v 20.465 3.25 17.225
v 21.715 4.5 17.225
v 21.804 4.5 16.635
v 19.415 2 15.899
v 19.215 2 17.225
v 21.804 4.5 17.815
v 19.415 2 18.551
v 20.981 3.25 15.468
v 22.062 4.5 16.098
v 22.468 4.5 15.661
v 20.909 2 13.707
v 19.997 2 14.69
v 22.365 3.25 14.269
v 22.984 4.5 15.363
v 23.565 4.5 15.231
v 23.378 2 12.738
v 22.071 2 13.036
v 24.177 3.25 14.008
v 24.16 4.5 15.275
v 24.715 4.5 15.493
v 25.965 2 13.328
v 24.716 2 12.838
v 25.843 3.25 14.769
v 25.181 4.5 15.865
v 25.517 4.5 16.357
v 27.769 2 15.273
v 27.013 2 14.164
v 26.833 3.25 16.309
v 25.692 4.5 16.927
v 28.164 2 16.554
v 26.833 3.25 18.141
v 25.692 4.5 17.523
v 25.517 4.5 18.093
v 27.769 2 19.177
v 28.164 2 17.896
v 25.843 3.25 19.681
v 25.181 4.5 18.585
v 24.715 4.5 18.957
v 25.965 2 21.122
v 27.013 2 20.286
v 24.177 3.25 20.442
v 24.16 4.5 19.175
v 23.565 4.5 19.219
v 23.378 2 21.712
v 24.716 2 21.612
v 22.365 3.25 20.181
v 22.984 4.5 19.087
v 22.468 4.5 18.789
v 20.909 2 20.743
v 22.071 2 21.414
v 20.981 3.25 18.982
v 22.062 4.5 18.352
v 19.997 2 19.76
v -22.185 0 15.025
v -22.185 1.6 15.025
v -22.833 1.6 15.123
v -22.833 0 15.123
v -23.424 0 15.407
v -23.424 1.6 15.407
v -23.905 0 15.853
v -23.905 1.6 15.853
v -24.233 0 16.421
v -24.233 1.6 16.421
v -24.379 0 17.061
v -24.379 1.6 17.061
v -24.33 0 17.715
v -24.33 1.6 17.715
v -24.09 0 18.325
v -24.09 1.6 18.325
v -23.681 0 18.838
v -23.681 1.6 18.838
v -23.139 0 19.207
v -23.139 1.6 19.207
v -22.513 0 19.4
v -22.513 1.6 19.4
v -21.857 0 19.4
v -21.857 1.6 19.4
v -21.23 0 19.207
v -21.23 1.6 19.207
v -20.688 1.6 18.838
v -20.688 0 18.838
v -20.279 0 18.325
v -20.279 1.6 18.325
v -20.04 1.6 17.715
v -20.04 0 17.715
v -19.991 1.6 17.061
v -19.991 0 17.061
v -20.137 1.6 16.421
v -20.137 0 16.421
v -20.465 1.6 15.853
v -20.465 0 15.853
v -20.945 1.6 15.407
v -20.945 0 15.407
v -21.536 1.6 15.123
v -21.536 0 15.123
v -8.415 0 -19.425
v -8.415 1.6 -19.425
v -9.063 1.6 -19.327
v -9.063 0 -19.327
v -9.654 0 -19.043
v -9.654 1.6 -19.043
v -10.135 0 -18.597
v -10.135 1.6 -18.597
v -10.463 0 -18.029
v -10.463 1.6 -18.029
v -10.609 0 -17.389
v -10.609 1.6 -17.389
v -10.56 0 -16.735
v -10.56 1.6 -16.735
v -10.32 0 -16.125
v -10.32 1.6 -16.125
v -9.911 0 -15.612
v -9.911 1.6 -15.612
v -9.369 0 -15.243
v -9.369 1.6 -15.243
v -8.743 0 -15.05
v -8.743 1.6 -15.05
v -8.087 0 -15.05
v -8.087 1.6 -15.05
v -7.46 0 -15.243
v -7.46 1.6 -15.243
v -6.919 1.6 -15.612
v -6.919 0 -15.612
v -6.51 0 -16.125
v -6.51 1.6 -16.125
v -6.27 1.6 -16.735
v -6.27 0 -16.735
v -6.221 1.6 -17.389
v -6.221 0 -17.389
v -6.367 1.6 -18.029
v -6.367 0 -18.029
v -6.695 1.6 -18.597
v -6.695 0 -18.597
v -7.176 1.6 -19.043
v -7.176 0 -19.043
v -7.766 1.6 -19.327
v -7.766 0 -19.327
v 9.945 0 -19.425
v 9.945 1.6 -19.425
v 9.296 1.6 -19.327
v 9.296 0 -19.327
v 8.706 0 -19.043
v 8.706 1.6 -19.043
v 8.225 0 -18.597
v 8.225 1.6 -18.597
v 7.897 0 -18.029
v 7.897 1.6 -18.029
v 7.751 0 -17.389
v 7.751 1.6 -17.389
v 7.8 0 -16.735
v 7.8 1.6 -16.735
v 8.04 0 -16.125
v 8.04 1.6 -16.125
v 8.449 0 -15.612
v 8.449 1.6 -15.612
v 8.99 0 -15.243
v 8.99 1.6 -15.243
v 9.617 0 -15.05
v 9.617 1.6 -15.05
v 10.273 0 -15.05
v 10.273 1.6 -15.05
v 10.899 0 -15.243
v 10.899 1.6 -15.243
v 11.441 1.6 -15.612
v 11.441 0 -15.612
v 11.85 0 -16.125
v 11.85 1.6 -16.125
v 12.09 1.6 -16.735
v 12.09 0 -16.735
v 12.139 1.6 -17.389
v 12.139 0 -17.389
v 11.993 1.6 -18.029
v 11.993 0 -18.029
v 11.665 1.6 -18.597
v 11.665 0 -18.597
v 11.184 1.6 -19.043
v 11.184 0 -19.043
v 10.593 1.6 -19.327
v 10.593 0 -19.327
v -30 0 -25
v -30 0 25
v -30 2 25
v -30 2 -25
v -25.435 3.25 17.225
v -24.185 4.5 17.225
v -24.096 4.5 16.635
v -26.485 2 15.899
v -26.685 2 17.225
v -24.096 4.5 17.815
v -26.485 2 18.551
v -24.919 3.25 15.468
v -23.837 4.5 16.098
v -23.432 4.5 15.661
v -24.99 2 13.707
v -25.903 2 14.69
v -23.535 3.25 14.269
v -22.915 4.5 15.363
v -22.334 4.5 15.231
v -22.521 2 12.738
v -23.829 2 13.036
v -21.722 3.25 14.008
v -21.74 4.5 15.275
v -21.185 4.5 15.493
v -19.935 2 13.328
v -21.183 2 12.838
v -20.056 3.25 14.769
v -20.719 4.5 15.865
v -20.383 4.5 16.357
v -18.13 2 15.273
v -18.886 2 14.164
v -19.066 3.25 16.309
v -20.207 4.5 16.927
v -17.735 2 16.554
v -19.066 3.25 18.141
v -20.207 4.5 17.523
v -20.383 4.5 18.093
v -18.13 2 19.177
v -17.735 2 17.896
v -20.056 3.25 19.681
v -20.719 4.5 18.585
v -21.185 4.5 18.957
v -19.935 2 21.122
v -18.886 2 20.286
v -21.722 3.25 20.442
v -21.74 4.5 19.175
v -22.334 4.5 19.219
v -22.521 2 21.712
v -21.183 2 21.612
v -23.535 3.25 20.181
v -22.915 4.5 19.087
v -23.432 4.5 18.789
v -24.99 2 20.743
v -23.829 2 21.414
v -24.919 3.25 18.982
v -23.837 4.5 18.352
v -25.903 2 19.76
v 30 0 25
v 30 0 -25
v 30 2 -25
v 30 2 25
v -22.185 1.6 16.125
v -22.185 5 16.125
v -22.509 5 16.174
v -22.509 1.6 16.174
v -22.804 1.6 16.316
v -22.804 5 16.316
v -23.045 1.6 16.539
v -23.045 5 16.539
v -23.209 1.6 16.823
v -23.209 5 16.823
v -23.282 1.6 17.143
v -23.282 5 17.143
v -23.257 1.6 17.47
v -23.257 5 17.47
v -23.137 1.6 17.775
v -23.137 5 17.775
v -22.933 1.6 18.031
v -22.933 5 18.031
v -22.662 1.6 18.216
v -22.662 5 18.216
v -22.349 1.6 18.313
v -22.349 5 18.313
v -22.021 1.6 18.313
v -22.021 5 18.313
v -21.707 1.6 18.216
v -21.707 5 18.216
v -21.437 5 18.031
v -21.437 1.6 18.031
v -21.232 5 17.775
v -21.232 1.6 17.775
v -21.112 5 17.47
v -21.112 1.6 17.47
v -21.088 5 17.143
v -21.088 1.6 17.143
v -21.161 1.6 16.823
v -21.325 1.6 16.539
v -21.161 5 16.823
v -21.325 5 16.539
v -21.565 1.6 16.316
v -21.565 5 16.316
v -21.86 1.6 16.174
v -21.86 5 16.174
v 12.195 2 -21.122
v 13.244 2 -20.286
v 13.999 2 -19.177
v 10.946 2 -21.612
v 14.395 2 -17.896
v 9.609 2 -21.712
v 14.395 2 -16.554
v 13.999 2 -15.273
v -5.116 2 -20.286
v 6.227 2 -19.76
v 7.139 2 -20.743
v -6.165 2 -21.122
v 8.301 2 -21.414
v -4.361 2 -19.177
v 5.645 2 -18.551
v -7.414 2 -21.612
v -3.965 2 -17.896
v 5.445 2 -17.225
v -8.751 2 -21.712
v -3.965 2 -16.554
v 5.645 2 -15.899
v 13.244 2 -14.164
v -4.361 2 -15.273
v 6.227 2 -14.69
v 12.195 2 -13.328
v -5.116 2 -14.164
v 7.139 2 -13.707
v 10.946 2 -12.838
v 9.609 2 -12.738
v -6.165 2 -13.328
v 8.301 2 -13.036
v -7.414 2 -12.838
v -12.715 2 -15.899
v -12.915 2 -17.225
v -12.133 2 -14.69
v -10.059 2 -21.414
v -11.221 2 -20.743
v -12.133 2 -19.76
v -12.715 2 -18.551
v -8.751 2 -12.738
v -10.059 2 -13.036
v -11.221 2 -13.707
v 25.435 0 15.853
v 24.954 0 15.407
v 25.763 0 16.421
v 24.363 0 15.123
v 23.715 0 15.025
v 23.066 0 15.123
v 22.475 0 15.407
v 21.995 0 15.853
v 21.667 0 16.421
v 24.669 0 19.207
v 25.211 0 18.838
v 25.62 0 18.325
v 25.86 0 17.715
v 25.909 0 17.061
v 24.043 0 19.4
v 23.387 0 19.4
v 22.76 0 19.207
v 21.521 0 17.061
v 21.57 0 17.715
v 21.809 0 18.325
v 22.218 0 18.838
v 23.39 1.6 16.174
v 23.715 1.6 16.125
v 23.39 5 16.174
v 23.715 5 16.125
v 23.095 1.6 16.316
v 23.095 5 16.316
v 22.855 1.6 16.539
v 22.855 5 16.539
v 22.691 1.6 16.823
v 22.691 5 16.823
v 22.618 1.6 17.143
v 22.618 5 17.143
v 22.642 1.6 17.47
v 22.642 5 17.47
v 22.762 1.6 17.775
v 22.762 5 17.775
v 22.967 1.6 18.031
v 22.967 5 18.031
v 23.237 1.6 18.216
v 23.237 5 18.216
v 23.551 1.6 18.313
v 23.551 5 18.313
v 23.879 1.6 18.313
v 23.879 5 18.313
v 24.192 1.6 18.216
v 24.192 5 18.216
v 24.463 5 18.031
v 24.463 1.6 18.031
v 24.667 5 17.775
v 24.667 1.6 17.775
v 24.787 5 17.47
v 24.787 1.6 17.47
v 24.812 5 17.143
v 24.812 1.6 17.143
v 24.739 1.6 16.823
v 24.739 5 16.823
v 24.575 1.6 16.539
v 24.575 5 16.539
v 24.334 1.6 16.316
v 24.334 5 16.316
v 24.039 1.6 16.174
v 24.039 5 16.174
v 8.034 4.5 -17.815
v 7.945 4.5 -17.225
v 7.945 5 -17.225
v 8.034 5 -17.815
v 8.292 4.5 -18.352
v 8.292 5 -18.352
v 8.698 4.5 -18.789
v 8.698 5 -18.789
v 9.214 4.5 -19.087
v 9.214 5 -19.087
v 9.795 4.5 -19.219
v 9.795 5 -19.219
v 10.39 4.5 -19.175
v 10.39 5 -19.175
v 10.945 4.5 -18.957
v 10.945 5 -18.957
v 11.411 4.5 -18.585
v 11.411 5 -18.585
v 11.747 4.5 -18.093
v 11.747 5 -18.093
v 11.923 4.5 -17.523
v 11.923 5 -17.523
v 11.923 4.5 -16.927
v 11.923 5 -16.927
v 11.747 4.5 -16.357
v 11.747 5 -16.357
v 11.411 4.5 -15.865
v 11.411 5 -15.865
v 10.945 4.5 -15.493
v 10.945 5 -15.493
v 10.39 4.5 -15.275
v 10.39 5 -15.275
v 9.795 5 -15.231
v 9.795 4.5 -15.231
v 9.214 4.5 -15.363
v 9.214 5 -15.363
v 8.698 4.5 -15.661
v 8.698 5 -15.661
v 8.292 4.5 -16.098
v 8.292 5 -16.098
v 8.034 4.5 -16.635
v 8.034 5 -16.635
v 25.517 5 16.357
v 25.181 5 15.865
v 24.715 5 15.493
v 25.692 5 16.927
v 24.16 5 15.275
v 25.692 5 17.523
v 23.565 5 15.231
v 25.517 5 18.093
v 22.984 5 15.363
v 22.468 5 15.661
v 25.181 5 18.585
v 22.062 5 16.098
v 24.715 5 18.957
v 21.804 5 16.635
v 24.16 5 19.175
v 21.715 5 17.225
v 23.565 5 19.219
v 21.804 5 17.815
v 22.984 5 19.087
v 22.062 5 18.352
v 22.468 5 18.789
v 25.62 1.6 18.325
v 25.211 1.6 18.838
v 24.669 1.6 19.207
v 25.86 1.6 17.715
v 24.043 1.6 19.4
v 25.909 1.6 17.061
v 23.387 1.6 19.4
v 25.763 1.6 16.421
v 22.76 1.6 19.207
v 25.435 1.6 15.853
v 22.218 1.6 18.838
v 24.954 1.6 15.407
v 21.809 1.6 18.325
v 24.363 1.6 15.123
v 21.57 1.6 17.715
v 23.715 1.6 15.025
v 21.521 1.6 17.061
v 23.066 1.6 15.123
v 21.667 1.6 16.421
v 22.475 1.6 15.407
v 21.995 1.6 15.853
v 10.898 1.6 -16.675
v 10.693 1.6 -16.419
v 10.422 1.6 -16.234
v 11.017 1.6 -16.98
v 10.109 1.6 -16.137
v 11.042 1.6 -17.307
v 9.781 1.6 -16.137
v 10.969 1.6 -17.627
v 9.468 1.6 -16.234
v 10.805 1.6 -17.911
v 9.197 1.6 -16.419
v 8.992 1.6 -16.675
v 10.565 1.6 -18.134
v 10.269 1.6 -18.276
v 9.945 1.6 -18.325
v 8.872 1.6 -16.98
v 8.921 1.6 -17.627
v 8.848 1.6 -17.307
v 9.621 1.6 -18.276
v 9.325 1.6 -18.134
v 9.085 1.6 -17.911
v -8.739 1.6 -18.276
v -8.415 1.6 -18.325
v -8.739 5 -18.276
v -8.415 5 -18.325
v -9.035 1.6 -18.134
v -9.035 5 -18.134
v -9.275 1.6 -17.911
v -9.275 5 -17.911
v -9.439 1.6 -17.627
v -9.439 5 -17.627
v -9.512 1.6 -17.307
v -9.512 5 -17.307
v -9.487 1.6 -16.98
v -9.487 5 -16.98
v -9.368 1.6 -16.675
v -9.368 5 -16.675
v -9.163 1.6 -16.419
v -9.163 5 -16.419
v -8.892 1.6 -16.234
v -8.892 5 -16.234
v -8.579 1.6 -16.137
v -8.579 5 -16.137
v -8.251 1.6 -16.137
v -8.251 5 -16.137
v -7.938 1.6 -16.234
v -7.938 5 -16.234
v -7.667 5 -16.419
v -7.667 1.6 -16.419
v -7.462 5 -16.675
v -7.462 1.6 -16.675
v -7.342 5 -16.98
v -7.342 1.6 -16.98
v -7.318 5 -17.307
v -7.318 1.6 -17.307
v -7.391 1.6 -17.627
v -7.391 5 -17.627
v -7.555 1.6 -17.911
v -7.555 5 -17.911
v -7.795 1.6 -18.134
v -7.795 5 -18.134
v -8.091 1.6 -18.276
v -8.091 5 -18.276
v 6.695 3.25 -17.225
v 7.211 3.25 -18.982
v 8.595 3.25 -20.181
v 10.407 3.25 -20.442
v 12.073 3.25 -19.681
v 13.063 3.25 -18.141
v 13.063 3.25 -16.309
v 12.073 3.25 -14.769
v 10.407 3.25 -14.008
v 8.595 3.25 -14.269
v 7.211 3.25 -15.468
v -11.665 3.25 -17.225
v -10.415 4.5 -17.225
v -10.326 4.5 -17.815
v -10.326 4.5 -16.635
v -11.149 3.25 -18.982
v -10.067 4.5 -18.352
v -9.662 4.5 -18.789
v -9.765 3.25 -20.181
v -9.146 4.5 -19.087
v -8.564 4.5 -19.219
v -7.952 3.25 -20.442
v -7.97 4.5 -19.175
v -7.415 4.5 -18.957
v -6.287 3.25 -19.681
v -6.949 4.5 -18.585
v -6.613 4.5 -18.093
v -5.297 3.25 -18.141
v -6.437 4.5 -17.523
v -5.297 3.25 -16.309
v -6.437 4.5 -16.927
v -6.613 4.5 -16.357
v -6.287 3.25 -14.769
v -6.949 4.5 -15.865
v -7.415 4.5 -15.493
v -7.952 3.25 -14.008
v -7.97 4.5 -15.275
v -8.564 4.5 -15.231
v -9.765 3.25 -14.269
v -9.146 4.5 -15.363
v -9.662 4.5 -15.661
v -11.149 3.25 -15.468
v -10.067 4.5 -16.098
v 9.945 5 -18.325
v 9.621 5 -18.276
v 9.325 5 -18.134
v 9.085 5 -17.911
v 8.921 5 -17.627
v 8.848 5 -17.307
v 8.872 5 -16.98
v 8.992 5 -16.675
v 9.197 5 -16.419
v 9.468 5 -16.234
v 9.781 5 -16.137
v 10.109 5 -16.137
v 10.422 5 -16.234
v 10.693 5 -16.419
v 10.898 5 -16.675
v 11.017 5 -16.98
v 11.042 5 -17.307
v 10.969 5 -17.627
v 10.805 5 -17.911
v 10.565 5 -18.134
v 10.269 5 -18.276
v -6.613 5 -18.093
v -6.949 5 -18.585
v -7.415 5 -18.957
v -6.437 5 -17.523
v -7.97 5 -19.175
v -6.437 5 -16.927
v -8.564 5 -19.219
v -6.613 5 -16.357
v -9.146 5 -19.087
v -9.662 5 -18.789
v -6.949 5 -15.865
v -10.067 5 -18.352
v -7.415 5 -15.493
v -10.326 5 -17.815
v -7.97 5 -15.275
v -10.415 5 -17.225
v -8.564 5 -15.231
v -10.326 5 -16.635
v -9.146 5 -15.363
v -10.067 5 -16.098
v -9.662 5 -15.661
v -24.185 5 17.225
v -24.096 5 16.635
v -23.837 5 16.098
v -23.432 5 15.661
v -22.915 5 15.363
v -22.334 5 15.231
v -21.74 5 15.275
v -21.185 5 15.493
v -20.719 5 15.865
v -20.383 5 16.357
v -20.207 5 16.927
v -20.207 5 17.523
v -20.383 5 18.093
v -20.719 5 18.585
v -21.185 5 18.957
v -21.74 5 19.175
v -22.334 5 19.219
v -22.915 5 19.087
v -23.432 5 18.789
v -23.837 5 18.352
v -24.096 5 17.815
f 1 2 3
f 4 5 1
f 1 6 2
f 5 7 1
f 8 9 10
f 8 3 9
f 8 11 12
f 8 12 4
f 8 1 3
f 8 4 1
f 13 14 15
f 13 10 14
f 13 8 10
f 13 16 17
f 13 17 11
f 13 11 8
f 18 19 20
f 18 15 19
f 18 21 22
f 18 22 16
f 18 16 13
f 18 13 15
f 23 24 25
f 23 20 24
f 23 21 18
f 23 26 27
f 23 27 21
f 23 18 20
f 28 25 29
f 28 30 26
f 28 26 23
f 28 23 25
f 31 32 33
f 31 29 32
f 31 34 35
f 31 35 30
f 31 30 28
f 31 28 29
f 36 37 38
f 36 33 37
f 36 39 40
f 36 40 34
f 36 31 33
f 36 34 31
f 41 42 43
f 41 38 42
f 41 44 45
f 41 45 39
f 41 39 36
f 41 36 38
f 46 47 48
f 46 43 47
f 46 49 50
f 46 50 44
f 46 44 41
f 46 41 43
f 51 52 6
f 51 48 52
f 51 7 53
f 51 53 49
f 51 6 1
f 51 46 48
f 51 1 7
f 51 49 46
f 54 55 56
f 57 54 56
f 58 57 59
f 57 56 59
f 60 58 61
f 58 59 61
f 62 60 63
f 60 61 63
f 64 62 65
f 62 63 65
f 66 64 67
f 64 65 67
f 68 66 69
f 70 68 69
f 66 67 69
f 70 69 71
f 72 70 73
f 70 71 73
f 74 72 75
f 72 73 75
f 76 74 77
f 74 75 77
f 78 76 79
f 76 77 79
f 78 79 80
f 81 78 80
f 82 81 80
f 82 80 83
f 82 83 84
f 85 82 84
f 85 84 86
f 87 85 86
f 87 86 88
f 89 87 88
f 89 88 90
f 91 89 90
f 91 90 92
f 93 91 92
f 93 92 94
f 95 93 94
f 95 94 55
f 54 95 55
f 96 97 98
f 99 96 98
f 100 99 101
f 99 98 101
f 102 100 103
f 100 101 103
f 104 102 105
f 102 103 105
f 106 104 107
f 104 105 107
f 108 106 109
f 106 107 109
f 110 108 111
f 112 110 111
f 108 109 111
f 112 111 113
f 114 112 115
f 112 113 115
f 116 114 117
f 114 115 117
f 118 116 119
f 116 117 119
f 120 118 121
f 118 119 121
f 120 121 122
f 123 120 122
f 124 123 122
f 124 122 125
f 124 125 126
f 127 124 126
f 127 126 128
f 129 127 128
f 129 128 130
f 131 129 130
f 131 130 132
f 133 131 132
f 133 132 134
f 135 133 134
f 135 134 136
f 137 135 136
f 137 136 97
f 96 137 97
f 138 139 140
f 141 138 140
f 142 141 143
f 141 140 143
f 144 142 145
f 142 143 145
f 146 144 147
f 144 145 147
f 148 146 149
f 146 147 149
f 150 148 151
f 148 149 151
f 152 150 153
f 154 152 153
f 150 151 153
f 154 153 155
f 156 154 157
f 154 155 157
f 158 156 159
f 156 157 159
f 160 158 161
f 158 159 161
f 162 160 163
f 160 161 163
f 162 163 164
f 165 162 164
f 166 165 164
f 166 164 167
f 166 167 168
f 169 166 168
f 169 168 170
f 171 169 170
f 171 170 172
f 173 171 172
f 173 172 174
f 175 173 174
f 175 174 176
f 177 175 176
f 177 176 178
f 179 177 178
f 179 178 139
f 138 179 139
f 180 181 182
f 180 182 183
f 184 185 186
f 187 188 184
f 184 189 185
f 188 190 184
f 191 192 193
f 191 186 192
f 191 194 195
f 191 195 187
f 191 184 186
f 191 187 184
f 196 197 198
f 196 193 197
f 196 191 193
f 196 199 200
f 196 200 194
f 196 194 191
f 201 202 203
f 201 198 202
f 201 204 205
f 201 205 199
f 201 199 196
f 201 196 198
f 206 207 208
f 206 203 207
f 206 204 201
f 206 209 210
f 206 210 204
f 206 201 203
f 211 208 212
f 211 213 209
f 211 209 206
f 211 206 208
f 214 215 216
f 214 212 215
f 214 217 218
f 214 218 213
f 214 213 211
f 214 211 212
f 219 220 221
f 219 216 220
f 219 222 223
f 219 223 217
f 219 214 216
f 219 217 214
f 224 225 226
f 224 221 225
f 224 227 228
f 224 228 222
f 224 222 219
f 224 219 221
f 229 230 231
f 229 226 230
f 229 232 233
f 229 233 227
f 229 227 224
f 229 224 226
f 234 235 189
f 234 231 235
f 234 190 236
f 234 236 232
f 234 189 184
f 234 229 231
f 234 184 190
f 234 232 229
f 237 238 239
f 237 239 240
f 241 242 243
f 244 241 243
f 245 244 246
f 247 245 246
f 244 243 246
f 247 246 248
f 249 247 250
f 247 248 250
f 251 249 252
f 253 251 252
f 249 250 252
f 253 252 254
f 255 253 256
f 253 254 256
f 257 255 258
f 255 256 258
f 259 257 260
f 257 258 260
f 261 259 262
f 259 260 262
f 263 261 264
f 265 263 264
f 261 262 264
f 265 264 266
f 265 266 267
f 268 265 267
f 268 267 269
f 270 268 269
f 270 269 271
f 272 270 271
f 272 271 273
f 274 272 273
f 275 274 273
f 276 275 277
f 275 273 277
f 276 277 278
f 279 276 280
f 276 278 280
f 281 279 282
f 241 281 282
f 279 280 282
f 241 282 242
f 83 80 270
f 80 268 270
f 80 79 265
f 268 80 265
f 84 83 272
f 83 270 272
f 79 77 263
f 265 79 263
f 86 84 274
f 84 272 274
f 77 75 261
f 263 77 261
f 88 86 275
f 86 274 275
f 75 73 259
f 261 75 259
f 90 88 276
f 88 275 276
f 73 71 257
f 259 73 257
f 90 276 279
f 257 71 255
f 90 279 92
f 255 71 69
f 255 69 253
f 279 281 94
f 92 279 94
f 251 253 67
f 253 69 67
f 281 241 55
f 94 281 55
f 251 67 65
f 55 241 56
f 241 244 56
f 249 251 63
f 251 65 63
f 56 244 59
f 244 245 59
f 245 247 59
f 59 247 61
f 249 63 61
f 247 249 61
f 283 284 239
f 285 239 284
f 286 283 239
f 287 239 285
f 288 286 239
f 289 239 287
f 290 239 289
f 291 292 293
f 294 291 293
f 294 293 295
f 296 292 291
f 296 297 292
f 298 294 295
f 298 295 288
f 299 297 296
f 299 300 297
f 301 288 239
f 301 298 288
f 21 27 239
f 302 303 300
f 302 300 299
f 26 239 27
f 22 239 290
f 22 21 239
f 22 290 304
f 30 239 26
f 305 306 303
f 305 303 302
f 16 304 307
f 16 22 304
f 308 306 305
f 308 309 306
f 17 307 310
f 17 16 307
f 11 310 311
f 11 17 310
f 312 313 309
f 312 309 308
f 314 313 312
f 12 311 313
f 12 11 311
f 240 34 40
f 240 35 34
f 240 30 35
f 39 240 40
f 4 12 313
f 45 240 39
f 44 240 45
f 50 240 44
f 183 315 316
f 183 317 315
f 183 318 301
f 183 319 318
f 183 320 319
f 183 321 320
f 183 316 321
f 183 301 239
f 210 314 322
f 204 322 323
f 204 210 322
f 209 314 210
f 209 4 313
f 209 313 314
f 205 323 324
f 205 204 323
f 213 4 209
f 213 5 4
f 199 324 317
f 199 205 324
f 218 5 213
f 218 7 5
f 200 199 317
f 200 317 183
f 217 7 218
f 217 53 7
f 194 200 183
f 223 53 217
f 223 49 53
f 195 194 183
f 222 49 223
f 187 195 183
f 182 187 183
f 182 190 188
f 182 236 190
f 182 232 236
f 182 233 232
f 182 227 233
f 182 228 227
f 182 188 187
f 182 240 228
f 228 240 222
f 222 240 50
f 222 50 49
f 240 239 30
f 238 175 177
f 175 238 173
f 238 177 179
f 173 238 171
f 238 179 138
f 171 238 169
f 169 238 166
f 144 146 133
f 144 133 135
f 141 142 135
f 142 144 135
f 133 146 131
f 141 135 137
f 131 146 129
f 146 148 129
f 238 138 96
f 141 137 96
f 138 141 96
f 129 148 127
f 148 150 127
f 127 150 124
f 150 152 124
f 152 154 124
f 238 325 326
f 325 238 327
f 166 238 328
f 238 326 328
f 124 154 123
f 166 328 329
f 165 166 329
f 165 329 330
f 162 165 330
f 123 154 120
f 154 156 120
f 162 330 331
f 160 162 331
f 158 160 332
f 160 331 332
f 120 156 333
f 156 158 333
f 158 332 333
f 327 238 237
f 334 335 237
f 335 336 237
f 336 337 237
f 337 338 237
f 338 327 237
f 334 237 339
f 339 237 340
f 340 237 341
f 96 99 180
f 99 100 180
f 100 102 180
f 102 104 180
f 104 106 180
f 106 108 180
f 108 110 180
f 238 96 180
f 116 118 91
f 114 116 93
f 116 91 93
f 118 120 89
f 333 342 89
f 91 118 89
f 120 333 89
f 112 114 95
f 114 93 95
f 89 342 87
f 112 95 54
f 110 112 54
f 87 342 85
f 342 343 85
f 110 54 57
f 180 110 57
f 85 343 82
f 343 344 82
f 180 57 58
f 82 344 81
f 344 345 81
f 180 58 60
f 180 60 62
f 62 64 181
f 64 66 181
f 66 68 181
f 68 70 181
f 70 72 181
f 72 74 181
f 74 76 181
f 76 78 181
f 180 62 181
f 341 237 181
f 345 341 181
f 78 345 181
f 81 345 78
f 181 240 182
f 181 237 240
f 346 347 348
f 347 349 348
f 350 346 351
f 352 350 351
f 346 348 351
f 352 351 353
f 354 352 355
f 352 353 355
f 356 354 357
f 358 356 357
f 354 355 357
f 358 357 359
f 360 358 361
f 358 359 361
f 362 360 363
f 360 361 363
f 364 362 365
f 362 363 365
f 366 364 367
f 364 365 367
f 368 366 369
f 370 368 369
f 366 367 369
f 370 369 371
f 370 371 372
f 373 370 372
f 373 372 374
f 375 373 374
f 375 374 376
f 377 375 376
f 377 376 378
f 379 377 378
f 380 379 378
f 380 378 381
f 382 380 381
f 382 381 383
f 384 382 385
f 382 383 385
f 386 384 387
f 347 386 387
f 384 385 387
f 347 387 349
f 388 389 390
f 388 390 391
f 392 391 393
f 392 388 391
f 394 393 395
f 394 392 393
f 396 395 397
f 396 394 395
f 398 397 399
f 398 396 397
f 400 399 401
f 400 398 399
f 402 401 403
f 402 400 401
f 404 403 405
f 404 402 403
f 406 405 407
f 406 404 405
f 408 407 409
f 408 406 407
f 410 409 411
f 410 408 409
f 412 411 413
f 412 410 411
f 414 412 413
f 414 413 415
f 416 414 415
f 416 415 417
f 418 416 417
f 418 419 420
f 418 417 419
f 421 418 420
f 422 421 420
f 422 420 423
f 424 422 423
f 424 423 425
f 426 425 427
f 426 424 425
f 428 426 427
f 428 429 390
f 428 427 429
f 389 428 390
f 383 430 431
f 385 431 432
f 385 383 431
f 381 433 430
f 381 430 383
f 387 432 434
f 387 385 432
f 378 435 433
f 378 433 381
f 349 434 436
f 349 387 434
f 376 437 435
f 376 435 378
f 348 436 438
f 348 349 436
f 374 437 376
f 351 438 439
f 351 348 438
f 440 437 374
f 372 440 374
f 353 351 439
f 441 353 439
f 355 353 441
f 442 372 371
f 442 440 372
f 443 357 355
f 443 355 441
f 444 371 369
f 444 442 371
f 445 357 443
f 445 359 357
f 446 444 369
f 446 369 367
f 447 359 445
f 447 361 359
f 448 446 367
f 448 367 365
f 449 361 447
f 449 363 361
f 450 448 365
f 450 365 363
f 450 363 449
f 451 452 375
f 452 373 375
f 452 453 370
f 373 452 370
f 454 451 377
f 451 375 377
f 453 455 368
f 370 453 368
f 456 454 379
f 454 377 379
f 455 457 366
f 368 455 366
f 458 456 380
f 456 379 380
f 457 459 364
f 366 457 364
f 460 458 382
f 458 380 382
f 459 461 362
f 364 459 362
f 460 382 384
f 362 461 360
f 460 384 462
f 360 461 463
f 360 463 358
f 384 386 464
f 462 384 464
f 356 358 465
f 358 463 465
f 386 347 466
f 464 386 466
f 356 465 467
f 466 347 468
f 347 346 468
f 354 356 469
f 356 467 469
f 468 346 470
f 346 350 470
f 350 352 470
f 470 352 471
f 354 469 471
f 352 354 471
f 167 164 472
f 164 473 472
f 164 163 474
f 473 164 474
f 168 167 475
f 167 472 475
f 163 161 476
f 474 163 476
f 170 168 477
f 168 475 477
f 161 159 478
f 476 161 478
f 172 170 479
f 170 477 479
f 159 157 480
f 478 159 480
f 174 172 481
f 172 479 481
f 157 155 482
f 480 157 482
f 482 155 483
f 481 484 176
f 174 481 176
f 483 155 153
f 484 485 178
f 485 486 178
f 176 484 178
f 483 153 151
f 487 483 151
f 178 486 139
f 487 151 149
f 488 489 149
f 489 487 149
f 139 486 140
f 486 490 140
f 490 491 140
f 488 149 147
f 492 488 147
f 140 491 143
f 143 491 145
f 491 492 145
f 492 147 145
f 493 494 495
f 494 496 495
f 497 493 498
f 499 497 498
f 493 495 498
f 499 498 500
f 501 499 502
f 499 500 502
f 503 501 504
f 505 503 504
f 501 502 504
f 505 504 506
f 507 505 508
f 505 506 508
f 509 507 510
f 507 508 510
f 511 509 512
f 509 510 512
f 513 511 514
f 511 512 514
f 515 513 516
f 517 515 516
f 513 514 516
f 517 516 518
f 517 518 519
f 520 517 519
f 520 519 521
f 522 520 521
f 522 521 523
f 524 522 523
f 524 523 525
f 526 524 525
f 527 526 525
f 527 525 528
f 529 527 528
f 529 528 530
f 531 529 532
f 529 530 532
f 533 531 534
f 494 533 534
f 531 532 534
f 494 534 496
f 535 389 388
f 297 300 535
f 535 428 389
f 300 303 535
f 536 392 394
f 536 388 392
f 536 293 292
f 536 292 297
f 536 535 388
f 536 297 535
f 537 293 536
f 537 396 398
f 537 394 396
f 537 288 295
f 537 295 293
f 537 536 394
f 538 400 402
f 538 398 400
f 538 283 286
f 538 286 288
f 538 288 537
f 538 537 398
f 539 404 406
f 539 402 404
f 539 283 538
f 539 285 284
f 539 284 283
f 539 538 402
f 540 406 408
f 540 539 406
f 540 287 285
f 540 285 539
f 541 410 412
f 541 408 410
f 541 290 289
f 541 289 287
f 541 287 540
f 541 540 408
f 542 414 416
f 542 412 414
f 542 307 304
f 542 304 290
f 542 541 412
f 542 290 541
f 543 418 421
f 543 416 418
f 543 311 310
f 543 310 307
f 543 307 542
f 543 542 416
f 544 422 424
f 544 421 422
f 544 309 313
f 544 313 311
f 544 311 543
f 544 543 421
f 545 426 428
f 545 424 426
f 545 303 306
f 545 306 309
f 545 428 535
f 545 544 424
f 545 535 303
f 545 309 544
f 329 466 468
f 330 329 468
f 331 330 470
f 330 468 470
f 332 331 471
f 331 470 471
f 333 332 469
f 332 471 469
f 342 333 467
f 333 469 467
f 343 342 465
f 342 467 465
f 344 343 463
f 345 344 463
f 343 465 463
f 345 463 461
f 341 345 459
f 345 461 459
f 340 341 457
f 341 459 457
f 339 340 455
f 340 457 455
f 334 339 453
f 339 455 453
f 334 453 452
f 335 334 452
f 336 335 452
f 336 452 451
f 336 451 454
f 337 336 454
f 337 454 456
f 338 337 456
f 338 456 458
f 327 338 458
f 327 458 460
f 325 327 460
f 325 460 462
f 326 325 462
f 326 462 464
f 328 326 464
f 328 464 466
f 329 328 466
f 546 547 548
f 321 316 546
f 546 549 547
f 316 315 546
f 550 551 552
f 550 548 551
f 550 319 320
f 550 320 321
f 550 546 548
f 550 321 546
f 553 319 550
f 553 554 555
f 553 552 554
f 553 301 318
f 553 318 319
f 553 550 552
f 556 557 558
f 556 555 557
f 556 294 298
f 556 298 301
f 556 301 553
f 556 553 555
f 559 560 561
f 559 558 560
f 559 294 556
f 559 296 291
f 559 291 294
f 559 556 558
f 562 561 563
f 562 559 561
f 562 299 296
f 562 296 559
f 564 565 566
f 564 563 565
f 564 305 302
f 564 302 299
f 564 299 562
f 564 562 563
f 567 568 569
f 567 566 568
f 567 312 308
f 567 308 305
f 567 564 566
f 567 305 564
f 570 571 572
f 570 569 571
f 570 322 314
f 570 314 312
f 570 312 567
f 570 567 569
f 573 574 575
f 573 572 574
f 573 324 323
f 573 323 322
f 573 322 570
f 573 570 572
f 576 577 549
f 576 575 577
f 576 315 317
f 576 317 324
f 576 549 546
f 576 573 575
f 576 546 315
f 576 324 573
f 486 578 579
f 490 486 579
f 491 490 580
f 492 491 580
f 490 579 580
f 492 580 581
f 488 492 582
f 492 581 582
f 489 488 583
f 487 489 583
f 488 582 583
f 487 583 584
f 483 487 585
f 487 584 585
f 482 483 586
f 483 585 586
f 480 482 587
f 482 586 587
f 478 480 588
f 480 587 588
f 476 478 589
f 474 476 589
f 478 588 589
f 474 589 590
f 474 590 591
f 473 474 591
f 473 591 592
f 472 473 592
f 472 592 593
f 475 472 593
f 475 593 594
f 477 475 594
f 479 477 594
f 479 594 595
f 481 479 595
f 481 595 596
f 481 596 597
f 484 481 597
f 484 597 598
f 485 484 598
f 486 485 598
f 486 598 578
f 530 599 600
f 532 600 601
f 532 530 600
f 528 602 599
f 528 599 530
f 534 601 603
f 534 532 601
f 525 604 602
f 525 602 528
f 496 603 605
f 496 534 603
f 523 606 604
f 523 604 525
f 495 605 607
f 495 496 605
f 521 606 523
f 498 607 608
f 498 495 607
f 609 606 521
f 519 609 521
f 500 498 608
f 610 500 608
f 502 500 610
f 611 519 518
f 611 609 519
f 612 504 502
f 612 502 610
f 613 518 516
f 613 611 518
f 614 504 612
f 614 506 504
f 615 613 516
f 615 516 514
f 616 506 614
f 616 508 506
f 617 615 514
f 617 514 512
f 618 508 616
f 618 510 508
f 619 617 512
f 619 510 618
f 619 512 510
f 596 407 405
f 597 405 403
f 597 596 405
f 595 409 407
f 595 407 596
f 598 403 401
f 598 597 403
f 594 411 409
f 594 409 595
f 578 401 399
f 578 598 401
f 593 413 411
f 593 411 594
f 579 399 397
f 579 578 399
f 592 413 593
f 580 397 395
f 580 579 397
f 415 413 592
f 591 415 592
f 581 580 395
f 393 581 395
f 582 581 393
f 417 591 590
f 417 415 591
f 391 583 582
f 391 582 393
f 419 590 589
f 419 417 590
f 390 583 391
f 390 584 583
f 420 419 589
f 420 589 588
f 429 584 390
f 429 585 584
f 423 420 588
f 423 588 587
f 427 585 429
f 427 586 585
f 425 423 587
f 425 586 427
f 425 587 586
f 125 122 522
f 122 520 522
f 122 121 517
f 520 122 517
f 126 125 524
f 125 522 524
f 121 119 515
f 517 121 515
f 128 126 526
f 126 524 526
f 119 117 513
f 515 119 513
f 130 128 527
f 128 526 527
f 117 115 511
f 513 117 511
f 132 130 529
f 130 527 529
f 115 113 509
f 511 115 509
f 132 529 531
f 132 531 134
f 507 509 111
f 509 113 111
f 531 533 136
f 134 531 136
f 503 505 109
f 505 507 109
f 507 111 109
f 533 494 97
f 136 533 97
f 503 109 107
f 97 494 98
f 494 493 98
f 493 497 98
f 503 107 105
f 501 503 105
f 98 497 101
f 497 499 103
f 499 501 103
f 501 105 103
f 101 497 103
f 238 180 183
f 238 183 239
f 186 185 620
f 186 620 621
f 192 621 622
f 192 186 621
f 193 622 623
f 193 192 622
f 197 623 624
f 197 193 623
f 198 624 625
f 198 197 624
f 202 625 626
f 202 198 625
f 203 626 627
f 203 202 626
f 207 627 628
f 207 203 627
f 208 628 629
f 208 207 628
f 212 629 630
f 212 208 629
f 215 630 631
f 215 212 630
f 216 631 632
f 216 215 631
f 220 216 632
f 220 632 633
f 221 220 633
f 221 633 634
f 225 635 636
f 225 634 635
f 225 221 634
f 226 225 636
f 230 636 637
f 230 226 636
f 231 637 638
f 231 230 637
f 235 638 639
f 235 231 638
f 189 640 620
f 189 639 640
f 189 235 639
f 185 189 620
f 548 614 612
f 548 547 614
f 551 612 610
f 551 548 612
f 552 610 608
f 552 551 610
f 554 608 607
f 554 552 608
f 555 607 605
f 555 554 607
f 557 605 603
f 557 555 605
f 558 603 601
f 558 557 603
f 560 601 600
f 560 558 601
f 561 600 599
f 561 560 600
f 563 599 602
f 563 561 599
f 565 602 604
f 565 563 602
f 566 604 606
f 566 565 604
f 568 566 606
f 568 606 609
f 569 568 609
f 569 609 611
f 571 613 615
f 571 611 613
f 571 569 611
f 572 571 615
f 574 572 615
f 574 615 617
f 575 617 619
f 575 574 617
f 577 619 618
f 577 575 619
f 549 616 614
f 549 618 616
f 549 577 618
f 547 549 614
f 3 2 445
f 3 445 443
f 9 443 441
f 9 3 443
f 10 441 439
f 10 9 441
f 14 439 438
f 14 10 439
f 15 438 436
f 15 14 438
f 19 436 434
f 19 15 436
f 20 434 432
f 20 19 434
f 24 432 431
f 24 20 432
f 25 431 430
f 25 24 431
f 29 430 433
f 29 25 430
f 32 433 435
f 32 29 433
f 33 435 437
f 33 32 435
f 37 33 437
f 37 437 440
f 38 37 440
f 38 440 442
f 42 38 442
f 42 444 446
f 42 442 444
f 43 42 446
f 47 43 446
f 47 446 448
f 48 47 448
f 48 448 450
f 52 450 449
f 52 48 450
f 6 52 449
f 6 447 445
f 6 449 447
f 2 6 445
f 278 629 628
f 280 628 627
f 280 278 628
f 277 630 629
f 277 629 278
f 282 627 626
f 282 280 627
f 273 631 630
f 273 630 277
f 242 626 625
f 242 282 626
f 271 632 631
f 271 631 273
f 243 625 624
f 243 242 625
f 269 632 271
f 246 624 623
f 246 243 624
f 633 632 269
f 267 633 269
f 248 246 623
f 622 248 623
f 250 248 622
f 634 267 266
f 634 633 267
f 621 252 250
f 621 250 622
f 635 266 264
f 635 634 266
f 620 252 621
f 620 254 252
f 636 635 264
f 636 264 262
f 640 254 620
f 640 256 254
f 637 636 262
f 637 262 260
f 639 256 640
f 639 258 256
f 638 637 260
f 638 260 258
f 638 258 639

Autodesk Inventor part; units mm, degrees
ref_plane "YZ Plane" through (0, 0, 0) normal (1, 0, 0) x (0, 1, 0)
ref_plane "XZ Plane" through (0, 0, 0) normal (0, 1, 0) x (-1, 0, 0)
ref_plane "XY Plane" through (0, 0, 0) normal (0, 0, 1) x (1, 0, 0)
sketch "Sketch1" plane through (0, 0, 0) normal (0, 1, 0) x (-1, 0, 0)
  circle A0 centre (-9.9449, -17.225) radius 1 construction
  circle A1 centre (8.4149, -17.225) radius 1 construction
  circle A2 centre (22.1847, 17.225) radius 1 construction
  circle A3 centre (-23.7147, 17.225) radius 1 construction
  circle A4 centre (-9.9449, -17.225) radius 2
  circle A5 centre (8.4149, -17.225) radius 2
  circle A6 centre (22.1847, 17.225) radius 2
  circle A7 centre (-23.7147, 17.225) radius 2
  line L0 (30, -25) -> (-30, -25)
  line L1 (-30, -25) -> (-30, 25)
  line L2 (-30, 25) -> (30, 25)
  line L3 (30, 25) -> (30, -25)
  line L4 (0, -35) -> (0, 35)
  line L5 (42, 0) -> (-42, 0)
  point P0 (0, 0)
  point P1 (25.2446, -19.875)
  dimension "d0" = 25.2446
  dimension "d1" = 19.875
  dimension "d2" = 16.8298
  dimension "d3" = 18.3597
  dimension "d4" = 2.65
  dimension "d5" = 37.1
  dimension "d6" = 3.06
  dimension "d7" = 45.8993
  dimension "d9" = 2
  dimension "d10" = 1
  dimension "d11" = 60
  dimension "d12" = 50
extrude "Extrusion1" add sketch "Sketch1" along normal blind 5 contours A4 | A5 | A6 | A7
extrude "Extrusion2" add sketch "Sketch1" along normal blind 2
chamfer "Chamfer1" distance 2.5 angle 45 4 edges at (-6.4149, 2, -17.225) (11.9449, 2, -17.225) (25.7147, 2, 17.225) (-20.1847, 2, 17.225)
hole "Hole1" at (-8.4149, 0, -17.225) at (9.9449, 0, -17.225) at (-22.1847, 0, 17.225) at (23.7147, 0, 17.225) direction (0, 1, 0) diameter 2.2 end through all counterbore diameter 4.4 counterbore depth 1.6
equation "\"pitch\" = 5.3"
equation "\"pitch_x\" = 0.866025 * pitch"
equation "\"cell_w\" = 1.1547 * pitch"
properties part number "Panel mount plate"
